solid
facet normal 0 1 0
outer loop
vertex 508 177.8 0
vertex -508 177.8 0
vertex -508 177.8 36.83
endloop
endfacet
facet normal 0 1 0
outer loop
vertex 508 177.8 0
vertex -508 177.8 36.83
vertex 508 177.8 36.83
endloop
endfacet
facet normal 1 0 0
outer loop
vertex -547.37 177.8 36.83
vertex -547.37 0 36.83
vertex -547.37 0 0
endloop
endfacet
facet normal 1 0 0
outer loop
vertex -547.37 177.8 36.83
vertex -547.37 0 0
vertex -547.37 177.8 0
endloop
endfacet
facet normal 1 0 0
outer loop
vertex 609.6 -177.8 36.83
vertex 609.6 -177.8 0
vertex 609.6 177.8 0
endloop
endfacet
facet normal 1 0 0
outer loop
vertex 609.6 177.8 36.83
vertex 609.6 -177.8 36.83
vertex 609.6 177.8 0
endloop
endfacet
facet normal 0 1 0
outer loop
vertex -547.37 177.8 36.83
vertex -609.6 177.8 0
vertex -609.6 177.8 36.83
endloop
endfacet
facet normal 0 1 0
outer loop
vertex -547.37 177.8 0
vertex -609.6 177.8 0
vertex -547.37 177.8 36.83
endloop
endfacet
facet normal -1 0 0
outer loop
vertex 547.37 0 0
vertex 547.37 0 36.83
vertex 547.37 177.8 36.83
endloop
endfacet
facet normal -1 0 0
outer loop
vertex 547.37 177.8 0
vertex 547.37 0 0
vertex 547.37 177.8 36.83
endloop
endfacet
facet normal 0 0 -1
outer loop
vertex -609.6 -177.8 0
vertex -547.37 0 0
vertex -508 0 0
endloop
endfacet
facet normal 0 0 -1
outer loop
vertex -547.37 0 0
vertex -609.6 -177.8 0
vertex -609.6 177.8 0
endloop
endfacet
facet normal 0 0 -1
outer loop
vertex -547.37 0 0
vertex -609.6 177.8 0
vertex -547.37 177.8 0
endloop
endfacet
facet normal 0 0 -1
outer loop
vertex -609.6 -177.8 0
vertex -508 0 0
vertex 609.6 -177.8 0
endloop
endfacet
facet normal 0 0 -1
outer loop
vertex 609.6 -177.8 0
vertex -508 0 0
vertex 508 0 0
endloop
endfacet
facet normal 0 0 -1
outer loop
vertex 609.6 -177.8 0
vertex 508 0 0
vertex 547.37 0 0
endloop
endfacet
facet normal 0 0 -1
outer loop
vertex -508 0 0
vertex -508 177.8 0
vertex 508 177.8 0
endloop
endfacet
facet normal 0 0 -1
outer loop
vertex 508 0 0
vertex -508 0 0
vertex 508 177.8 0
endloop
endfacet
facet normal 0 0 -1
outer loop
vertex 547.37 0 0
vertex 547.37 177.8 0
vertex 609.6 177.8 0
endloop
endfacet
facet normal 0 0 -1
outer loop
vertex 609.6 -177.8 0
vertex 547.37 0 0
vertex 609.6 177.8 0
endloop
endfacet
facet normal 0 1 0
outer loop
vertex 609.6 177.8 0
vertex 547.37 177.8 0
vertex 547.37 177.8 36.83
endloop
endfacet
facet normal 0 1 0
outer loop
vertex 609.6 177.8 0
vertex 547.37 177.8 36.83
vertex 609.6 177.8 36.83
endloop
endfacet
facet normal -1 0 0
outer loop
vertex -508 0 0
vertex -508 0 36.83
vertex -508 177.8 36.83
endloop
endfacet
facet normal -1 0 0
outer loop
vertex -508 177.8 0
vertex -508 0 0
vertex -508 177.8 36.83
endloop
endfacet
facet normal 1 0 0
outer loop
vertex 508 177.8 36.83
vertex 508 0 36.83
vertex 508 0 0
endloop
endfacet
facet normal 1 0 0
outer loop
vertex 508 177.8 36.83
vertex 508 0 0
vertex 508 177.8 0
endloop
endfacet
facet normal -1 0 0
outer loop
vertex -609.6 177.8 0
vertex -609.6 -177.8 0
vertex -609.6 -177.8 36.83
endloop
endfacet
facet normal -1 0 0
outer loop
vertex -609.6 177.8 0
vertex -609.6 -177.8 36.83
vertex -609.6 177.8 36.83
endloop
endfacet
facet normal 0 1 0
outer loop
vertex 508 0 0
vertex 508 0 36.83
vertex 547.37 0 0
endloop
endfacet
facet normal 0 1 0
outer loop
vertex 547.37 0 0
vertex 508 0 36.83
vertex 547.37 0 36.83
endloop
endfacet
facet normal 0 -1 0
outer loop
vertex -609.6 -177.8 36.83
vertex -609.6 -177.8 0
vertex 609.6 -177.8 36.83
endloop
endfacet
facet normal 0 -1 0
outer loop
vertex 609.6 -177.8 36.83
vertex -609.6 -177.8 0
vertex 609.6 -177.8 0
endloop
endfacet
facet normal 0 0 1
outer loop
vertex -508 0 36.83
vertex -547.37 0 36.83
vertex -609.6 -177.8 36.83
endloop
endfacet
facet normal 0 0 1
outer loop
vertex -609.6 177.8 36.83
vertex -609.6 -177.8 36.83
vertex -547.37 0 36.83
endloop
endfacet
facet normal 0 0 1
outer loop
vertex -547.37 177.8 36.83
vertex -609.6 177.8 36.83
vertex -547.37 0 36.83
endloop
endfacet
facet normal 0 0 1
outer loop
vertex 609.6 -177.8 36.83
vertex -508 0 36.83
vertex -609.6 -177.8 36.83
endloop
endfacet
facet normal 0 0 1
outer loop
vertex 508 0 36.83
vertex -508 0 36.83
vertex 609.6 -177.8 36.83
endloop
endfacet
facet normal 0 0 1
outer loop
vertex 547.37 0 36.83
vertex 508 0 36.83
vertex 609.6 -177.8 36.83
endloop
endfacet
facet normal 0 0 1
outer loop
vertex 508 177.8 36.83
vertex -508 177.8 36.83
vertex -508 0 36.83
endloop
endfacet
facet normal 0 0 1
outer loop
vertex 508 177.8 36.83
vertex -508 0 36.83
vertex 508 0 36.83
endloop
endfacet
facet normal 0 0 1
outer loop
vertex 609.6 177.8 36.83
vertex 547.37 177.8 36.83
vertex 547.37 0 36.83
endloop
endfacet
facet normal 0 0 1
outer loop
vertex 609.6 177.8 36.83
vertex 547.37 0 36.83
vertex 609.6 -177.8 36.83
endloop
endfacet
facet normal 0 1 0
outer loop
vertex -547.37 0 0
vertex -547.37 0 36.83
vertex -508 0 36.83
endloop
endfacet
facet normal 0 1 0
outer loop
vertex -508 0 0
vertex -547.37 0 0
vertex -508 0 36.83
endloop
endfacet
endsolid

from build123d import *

# Parameters (mm, degrees)
F0_W     = 1219.2
F0_H     = 355.6
F1_DEPTH = 36.83
F2_W     = 39.37
F2_H     = 177.8
F3_DEPTH = 36.83


with BuildPart() as f1:
    # F0 (on Top) → F1 (new body)
    with BuildSketch(Plane.XY):
        Rectangle(F0_W, F0_H)
    extrude(amount=F1_DEPTH)

    # F2 (on face) → F3 (cut, through all)
    with BuildSketch(Plane.XY.offset(36.83)):
        with Locations((-527.685, 88.9)):
            Rectangle(F2_W, F2_H)
        with Locations((527.685, 88.9)):
            Rectangle(F2_W, F2_H)
    extrude(amount=-F3_DEPTH, mode=Mode.SUBTRACT)


solid = f1.part
